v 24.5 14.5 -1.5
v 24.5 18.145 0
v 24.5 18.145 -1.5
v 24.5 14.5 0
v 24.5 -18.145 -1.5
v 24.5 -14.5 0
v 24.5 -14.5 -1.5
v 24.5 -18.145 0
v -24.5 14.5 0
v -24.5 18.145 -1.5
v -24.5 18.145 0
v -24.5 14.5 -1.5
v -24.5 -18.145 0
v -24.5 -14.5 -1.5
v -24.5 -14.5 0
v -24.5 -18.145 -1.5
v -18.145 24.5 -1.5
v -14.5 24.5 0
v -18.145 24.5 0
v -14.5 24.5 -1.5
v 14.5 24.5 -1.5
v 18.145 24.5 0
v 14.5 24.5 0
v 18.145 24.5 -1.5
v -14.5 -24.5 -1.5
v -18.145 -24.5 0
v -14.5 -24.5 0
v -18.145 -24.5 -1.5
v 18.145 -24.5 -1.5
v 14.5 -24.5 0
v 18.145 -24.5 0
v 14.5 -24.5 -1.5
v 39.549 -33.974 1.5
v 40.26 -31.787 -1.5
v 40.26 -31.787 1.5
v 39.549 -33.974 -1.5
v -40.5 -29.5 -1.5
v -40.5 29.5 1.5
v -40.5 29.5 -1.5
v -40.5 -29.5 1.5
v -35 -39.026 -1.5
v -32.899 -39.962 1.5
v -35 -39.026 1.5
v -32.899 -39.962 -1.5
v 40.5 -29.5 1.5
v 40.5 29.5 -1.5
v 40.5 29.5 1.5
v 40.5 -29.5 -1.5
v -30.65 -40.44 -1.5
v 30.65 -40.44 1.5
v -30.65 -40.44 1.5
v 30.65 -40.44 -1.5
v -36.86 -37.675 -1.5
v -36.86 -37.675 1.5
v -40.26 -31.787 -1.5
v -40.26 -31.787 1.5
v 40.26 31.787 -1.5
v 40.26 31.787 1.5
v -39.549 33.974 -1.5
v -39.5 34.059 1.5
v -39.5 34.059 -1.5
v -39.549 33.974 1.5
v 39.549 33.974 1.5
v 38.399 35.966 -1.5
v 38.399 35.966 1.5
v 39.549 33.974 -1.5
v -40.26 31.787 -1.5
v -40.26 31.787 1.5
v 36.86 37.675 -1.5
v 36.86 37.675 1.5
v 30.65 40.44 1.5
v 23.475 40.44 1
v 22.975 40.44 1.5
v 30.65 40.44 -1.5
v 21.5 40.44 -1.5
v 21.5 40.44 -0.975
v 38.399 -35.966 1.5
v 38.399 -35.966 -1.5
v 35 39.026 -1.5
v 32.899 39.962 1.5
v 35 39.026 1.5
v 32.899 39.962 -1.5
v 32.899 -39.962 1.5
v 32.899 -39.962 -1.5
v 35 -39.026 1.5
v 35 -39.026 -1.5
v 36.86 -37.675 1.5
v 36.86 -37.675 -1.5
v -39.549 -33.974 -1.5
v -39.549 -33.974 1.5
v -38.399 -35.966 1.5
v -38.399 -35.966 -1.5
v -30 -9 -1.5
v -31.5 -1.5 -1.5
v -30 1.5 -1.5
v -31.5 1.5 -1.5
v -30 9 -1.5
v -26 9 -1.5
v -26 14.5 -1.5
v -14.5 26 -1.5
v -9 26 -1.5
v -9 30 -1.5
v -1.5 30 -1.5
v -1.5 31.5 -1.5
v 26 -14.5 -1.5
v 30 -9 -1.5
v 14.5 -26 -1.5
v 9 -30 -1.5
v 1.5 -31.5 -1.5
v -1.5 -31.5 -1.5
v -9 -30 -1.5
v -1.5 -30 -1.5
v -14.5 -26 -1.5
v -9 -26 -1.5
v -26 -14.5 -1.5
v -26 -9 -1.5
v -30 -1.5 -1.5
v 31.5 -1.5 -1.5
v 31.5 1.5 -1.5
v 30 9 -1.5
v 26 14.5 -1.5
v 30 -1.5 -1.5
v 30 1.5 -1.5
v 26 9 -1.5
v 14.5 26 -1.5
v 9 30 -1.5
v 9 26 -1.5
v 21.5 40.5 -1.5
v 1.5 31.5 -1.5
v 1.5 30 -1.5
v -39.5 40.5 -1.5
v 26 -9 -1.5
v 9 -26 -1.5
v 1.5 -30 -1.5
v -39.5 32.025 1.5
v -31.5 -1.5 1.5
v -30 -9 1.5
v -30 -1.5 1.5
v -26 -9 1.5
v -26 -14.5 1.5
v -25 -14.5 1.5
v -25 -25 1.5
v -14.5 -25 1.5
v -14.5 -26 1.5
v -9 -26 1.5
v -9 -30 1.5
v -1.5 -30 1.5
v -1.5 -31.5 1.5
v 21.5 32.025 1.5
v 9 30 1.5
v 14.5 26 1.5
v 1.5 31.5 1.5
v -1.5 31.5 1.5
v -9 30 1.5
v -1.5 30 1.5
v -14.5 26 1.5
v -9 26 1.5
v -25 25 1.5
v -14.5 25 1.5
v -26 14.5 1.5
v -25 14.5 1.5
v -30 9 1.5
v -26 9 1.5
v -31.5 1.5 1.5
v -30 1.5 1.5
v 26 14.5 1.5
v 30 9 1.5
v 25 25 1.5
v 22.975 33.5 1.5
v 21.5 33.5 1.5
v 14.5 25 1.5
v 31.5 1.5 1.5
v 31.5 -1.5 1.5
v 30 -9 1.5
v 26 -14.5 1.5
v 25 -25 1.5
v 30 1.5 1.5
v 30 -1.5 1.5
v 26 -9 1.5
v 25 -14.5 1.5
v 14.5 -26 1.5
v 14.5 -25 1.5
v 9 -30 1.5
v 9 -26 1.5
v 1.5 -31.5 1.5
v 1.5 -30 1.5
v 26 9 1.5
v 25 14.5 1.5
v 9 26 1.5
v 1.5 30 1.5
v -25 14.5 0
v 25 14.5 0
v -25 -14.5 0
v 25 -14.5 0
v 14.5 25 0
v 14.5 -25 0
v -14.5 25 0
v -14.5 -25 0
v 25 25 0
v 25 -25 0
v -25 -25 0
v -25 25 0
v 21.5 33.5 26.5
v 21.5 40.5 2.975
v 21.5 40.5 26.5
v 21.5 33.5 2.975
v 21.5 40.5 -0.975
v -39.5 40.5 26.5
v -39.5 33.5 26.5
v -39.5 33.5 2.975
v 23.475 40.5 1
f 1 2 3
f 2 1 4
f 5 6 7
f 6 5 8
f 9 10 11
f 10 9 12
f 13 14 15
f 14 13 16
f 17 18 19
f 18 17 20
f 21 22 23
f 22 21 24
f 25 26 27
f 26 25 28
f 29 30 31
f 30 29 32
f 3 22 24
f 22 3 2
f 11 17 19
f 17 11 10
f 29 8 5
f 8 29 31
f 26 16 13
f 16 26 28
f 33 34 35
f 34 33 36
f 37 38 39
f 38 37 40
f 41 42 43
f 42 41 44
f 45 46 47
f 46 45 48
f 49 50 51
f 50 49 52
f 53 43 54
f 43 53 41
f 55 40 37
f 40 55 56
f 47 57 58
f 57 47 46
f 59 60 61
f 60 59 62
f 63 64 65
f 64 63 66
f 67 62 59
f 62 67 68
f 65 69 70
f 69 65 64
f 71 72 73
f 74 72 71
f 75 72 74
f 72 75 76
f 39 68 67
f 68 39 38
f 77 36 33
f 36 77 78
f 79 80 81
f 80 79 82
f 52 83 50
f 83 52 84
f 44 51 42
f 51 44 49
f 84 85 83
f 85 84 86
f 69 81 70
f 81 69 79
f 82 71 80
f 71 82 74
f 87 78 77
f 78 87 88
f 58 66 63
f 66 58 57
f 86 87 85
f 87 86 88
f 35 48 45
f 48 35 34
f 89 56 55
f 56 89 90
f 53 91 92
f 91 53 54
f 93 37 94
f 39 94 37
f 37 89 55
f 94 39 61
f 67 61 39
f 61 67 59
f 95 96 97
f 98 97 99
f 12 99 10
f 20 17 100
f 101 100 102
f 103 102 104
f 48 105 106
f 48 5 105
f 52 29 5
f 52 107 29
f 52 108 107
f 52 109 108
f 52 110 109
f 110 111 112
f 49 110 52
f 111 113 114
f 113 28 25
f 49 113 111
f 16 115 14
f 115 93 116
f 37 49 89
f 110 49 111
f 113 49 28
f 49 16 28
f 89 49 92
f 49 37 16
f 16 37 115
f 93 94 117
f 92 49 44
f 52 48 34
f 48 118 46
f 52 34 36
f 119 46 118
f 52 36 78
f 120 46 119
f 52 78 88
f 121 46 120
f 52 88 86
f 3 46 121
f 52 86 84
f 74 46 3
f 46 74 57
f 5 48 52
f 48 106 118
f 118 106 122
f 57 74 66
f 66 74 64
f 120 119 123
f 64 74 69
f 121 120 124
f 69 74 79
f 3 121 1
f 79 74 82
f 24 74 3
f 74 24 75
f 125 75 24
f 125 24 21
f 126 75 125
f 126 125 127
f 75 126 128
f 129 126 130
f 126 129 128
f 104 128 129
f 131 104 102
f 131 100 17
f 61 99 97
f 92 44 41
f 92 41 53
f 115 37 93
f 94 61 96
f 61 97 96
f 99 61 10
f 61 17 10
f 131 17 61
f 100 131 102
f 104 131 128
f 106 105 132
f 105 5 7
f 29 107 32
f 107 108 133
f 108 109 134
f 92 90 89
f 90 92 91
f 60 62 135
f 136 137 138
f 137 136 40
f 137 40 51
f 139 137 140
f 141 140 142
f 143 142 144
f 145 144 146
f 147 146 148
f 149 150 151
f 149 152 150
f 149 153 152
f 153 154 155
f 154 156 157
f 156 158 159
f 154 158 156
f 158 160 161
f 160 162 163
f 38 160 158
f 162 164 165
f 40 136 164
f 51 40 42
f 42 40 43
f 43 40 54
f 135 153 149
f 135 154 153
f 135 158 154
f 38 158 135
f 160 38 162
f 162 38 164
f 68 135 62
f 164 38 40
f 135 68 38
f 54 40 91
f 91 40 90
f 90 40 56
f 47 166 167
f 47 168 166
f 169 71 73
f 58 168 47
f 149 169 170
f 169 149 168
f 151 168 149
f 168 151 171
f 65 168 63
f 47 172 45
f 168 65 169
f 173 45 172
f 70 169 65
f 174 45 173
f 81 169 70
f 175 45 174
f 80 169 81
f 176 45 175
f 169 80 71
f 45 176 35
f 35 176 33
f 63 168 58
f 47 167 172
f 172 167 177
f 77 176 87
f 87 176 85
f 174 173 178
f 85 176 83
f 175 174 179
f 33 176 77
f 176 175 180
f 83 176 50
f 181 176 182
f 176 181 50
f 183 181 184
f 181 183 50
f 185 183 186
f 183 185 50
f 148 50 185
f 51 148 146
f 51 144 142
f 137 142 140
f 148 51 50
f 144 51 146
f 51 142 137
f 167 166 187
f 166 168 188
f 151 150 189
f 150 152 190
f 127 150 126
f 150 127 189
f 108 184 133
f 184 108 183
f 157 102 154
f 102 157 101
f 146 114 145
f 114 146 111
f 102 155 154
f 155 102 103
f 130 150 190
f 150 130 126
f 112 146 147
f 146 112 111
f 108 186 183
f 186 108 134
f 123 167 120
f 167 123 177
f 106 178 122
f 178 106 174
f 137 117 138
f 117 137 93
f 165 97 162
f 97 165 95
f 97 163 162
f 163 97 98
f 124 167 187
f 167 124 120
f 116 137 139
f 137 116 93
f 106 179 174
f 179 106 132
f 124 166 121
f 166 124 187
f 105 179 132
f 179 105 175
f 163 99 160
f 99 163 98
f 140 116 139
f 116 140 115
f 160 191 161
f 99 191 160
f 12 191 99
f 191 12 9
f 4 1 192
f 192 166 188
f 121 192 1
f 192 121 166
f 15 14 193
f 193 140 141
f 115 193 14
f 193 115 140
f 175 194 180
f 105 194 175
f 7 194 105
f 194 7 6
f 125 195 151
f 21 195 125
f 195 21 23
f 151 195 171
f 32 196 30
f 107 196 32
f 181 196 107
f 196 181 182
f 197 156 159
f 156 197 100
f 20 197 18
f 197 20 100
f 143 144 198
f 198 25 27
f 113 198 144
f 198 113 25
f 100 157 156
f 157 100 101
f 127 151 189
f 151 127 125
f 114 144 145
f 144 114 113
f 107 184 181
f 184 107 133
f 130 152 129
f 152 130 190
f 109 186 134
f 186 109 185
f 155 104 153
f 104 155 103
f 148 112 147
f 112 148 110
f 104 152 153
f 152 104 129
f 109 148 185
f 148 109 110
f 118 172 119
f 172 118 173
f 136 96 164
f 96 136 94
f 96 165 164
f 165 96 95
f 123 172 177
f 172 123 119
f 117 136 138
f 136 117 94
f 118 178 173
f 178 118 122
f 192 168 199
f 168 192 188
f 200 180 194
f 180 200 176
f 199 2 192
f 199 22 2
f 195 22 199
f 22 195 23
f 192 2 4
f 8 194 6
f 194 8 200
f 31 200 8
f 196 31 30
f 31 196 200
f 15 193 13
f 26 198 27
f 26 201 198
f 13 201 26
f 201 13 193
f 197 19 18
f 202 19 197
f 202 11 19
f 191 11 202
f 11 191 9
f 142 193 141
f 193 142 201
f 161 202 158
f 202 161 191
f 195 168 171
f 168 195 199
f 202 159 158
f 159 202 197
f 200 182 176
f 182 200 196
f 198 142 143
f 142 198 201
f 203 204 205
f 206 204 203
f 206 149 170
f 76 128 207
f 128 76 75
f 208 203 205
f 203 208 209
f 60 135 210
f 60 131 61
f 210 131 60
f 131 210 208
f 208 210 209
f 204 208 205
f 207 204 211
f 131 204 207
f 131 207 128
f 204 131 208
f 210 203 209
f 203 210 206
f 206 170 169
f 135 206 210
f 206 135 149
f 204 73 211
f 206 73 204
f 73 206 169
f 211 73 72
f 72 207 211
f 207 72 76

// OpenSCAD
module switchmiddle() {
union() {
difference() {
minkowski() {
cube([49,49,2],center=true);
cylinder(r=9,center=true);
}
minkowski() {
cube([33,42,4],center=true);
cylinder(r=3,center=true);
}
}
translate([20.75,0,-4]) cube([2.5,11,6],center=true);
translate([-20.75,0,-4]) cube([2.5,11,6],center=true);
}
}


module switchouter () {
difference() {
minkowski() {
cylinder(r=11, center=true);
cube([59,59,2],center=true);
}
cube([18,60,8],center=true);
cube([60,18,8],center=true);

cube([52,29,8],center=true);
cube([29,52,8],center=true);

cube([3,63,8],center=true);
cube([63,3,8],center=true);

difference() {
cube([49,49,8],center=true);
translate([39,39,0]) rotate([0,0,45]) cube([50,50,8],center=true);
translate([-39,39,0]) rotate([0,0,45]) cube([50,50,8],center=true);
translate([39,-39,0]) rotate([0,0,45]) cube([50,50,8],center=true);
translate([-39,-39,0]) rotate([0,0,45]) cube([50,50,8],center=true);
}
translate([0,0,2])cube([50,50,4],center=true);
}

}

module negative_servo() {
union() {
cube([40,19,33], center=true);
translate([-2.5,0,17]) cube([25,19,5], center=true);
translate([0,0,10.5]) cube([55,20,6], center=true);

translate([24,5,10]) cylinder(r=1.5, h=20, center=true);
translate([24,-5,10]) cylinder(r=1.5, h=20, center=true);
translate([-24,5,10]) cylinder(r=1.5, h=20, center=true);
translate([-24,-5,10]) cylinder(r=1.5, h=20, center=true);

translate([10.5,0,23]) cylinder(r=4.5, h=7, center=true);
translate([10.5,0,18]) cylinder(r=8.5, h=7, center=true);
translate([10.5,0,16]) cylinder(r=10, h=7, center=true);
translate([25,0,-13]) cube([50,7,5], center=true);
}
}

module servomount() {
difference() {
union() {
switchouter();
translate([-9,37,12.5])cube([61,7,28], center=true);
translate([-9,34,1]) rotate([45,0,0]) cube([61,3.5,3.5], center=true); //Bevels
translate([21,37,1]) rotate([0,45,0]) cube([3.5,7,3.5], center=true);
}
translate([-10.5,52.5,14.5]) rotate([90,0,0]) %negative_servo();
}
translate([0,0,4]) %switchmiddle();
}

module hornextension() {
difference() {
union() {
cube([35,18,5], center=true);
translate([-14,4,2]) rotate([0,45,0]) cube([10,10,10], center=true);
translate([14,4,2]) rotate([0,45,0]) cube([10,10,10], center=true);
}
translate([0,0,9.9])cube([45,25,15], center=true);
translate([0,32,0]) rotate ([0,0,45]) cube([50,50,50], center=true);
translate([-42.4,0,0])cube([50,50,15], center=true);
translate([42.4,0,0])cube([50,50,15], center=true);
}
}
servomount();
//hornextension();
